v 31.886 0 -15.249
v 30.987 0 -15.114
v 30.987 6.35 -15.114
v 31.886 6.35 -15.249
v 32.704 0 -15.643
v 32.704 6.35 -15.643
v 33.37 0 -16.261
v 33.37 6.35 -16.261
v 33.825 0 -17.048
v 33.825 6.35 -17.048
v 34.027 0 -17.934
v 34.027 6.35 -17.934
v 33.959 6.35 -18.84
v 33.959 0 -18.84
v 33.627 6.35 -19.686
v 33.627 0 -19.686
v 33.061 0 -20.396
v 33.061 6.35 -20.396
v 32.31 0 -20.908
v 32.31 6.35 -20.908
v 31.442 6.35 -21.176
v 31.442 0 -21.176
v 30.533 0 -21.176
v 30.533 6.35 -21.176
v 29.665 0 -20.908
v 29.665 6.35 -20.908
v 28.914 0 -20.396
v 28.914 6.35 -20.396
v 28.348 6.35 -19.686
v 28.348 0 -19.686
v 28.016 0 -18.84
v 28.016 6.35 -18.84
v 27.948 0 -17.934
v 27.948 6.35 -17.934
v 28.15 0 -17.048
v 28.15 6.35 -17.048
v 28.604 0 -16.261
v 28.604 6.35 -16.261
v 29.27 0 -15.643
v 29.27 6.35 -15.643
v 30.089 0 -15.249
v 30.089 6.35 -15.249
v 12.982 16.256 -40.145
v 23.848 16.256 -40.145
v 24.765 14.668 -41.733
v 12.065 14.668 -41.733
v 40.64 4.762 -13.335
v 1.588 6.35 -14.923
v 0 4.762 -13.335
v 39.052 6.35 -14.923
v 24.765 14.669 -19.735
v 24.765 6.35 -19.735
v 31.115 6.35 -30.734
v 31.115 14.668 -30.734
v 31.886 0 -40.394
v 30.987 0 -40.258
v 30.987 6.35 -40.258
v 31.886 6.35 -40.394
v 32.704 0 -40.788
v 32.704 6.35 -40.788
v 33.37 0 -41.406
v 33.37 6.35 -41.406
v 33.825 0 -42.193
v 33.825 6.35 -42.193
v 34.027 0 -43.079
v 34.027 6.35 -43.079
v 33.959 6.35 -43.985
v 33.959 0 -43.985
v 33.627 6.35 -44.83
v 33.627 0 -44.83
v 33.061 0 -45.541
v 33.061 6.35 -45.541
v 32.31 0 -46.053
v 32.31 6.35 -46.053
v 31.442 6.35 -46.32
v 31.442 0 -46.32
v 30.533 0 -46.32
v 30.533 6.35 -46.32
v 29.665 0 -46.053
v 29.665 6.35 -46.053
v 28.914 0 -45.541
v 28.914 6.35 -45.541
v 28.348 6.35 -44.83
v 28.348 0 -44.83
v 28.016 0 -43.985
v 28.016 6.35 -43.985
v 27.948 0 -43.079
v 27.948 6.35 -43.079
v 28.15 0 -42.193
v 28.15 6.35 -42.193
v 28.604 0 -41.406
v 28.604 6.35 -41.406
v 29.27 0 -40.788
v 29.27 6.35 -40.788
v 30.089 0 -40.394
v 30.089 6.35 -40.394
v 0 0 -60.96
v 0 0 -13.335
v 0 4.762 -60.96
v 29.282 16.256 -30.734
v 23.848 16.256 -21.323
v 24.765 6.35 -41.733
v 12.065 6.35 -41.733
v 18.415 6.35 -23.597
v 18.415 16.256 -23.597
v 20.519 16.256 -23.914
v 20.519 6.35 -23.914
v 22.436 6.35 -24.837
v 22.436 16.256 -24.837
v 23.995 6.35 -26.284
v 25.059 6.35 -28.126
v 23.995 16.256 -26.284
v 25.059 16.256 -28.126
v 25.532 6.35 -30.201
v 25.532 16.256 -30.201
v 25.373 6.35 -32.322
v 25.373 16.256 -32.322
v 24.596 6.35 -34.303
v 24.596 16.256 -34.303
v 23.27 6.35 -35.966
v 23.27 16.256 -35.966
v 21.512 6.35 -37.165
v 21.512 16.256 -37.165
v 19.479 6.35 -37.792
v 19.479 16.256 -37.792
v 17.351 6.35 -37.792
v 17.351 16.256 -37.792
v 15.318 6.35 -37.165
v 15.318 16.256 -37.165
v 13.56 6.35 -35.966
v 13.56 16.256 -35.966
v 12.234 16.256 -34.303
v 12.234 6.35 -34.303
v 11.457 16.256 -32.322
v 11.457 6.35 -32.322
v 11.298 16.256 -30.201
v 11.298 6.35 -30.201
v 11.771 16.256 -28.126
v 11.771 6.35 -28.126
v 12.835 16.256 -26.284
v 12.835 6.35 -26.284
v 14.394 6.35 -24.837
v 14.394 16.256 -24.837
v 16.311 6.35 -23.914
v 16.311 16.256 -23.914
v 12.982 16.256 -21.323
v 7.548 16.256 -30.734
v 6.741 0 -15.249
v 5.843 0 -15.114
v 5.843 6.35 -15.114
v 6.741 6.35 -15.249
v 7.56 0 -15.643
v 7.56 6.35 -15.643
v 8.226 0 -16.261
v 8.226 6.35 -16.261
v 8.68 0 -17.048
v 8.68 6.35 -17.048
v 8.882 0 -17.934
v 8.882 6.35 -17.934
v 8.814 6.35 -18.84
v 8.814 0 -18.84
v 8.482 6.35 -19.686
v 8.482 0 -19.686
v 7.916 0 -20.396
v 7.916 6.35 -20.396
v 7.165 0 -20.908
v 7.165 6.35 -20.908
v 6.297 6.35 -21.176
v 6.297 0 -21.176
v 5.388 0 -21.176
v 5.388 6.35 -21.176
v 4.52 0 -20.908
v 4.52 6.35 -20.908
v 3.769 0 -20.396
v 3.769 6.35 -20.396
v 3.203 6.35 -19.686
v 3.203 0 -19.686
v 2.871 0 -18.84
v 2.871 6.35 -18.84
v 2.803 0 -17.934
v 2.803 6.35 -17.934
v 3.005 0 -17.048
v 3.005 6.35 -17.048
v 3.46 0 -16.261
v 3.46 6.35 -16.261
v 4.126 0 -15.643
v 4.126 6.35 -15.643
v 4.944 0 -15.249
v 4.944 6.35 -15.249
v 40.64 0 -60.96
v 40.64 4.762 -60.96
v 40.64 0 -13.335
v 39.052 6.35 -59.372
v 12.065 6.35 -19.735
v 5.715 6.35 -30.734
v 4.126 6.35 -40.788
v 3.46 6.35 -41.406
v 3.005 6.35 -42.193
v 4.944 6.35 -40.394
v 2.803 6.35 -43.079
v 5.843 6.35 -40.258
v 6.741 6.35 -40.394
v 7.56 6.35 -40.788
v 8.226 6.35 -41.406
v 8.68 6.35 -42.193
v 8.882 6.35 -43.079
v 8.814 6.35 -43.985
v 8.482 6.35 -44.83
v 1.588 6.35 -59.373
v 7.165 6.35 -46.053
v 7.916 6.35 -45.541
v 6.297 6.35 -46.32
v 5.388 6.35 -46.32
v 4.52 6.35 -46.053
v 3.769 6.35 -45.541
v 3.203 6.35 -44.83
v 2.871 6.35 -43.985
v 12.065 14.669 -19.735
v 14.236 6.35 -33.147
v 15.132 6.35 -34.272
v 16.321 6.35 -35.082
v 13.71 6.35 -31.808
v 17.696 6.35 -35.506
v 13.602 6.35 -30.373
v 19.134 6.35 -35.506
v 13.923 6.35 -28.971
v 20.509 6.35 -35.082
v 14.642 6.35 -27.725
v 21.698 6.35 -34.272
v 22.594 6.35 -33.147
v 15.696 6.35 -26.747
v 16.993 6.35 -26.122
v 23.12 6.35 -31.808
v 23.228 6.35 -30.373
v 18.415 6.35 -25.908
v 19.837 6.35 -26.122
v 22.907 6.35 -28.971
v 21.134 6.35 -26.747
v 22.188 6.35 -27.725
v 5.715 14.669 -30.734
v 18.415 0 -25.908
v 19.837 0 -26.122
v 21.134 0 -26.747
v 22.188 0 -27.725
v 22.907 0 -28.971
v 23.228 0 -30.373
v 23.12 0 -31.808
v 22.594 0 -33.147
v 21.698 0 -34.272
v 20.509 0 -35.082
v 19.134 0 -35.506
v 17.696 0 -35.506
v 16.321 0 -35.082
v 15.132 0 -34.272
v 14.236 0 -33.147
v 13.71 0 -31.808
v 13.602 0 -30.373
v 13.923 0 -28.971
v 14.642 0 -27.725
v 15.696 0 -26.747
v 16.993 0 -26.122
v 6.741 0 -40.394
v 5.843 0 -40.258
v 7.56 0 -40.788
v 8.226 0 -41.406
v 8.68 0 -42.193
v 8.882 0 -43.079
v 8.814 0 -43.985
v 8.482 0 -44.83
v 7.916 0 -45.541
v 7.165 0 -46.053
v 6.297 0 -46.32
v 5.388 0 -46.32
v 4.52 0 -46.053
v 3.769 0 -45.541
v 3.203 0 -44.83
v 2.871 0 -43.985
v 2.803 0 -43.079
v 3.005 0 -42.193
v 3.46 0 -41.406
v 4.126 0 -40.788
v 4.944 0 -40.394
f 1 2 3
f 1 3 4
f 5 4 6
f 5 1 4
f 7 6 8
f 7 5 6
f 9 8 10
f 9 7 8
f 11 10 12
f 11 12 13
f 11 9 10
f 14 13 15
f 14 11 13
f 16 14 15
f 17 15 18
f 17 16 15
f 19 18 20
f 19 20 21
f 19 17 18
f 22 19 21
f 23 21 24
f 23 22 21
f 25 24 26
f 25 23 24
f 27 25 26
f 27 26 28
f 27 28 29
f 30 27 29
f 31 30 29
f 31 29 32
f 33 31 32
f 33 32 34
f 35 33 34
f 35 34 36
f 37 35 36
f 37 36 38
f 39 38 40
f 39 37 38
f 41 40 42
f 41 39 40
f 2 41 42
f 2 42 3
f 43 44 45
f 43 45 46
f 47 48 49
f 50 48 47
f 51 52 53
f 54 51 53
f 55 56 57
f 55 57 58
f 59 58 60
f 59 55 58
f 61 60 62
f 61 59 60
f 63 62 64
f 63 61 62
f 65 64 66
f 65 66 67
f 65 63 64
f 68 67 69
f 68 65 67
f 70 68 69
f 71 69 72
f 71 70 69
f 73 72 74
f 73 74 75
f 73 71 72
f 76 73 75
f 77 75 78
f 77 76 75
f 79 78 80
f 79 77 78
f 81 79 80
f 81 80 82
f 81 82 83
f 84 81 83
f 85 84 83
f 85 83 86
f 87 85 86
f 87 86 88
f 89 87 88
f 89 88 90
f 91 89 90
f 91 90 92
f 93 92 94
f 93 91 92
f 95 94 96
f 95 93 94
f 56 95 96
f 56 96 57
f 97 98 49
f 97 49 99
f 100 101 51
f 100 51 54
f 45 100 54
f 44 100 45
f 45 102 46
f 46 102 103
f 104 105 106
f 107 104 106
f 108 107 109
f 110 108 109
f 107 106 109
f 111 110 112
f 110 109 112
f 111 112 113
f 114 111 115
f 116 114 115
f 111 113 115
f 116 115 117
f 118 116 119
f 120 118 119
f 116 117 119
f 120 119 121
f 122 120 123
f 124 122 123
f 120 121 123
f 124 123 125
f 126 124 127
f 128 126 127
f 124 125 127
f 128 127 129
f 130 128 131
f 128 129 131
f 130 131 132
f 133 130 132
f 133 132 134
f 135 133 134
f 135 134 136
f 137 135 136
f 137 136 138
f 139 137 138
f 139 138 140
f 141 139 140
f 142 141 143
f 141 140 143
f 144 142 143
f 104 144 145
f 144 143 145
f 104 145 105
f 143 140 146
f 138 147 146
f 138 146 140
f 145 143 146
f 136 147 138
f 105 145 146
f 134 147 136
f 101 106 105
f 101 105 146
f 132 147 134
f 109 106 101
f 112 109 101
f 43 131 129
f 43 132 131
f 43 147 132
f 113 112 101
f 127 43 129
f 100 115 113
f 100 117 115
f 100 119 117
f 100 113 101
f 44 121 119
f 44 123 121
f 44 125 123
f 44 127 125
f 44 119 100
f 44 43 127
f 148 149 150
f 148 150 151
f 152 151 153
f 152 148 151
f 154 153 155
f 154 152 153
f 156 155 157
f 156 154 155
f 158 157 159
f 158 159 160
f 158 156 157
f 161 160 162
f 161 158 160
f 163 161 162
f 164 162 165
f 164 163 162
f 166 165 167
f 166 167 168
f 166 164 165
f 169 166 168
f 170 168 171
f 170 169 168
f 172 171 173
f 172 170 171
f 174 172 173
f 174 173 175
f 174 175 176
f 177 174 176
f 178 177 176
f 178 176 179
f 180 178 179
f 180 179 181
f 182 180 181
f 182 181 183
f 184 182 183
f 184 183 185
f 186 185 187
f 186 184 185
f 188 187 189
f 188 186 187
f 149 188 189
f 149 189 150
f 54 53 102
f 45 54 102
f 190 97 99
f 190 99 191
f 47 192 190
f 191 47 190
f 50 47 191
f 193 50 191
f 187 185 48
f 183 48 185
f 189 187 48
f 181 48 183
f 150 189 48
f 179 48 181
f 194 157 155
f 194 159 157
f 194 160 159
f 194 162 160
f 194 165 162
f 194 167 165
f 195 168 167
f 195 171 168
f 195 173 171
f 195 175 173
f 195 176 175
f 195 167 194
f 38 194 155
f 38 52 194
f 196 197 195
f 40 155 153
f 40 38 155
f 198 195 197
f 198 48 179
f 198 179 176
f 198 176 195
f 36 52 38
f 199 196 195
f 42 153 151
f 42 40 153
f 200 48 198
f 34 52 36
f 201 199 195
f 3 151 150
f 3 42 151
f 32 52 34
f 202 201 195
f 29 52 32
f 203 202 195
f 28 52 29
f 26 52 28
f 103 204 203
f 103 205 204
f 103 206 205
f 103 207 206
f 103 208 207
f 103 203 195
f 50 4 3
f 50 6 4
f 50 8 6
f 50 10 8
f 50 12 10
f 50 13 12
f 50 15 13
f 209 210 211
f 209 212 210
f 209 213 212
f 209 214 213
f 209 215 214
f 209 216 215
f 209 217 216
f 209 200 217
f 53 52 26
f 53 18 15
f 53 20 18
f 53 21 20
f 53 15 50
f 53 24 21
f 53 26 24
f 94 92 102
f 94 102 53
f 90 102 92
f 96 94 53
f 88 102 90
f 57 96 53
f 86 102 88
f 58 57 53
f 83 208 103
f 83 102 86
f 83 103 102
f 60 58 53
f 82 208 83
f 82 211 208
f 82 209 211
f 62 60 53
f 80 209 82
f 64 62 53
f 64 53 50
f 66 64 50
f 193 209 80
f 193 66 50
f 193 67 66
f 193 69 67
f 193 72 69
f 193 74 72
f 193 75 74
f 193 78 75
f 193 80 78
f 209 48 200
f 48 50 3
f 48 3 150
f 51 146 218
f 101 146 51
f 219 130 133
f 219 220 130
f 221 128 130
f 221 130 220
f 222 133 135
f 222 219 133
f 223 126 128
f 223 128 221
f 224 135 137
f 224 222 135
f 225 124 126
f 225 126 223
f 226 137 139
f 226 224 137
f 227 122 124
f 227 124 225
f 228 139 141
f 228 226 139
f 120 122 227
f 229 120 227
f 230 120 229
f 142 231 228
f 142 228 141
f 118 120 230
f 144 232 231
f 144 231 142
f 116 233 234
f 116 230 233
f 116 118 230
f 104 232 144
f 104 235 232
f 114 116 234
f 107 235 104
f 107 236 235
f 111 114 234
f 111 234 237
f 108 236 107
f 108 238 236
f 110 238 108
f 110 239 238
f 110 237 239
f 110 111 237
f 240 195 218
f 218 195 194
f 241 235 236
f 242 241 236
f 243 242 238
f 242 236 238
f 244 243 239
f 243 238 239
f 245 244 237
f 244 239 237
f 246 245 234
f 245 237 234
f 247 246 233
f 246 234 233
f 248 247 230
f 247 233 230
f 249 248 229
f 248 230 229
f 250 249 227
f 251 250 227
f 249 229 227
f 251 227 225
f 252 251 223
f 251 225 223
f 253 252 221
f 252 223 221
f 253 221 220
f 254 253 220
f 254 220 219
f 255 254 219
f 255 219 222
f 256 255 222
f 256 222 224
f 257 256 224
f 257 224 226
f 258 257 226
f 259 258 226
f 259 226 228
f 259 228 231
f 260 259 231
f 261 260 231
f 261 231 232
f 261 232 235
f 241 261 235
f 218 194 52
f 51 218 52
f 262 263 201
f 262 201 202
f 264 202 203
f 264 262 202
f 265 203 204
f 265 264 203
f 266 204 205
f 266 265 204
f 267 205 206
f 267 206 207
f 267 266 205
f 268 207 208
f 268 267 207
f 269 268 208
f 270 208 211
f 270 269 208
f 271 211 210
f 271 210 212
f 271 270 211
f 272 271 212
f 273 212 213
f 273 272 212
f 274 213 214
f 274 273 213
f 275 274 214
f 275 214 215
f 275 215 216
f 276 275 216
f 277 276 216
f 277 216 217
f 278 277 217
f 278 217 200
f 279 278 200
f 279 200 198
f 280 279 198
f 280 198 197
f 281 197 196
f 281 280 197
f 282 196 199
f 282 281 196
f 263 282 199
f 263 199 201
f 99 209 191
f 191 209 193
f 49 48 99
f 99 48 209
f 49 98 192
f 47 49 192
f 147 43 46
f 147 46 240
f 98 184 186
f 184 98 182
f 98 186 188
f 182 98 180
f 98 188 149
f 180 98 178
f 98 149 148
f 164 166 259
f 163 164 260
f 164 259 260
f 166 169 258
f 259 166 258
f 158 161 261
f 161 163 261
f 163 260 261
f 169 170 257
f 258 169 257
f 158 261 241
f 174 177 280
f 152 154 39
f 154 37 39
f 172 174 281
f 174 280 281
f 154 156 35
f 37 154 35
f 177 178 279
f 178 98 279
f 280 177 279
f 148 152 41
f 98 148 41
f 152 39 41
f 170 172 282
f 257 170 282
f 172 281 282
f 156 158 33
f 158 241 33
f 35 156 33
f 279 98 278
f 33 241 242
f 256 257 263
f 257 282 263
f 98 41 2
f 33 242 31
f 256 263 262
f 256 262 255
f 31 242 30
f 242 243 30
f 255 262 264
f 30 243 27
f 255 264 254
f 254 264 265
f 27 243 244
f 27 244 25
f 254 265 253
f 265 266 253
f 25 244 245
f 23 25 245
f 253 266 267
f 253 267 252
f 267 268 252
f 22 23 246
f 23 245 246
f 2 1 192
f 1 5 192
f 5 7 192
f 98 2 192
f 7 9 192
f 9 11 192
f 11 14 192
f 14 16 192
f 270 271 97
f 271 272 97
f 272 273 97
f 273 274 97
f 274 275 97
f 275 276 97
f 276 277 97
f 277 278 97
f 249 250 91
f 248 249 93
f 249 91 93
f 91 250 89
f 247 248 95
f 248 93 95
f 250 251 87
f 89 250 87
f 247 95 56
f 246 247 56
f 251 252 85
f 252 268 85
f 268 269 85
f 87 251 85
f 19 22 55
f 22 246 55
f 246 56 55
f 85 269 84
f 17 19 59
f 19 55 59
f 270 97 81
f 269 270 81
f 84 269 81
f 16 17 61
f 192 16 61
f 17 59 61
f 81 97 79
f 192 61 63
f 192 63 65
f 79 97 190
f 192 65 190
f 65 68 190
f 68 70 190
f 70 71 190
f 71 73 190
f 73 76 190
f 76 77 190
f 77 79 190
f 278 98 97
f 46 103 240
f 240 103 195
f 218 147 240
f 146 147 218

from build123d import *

# Parameters (mm, degrees)
SKETCH1_W           = 40.64
SKETCH1_H           = 47.625
SKETCH1_R           = 3.048
BOSS_EXTRUDE1_DEPTH = 6.35
BOSS_EXTRUDE2_DEPTH = 9.906
SKETCH3_R           = 4.826
CUT_EXTRUDE1_DEPTH  = 76.04657711
SKETCH4_R           = 7.1374
CUT_EXTRUDE2_DEPTH  = 9.906
CHAMFER1_SIZE       = 1.5875


with BuildPart() as part:
    # Sketch1 → Boss-Extrude1 (new body)
    with BuildSketch(Plane(origin=(0, 0, 0), x_dir=(1, 0, 0), z_dir=(0, 1, 0))):
        with Locations((20.32, 37.1475)):
            Rectangle(SKETCH1_W, SKETCH1_H)
        with Locations(Location((30.987358569, 18.161641431, 0), (0, 0, 270))):
            Circle(SKETCH1_R, mode=Mode.SUBTRACT)
        with Locations(Location((30.987358569, 43.306358569, 0), (0, 0, 270))):
            Circle(SKETCH1_R, mode=Mode.SUBTRACT)
        with Locations(Location((5.842641431, 18.161641431, 0), (0, 0, 270))):
            Circle(SKETCH1_R, mode=Mode.SUBTRACT)
        with Locations(Location((5.842641431, 43.306358569, 0), (0, 0, 270))):
            Circle(SKETCH1_R, mode=Mode.SUBTRACT)
    extrude(amount=BOSS_EXTRUDE1_DEPTH)

    # Sketch2 → Boss-Extrude2 (add)
    with BuildSketch(Plane(origin=(0, 6.35, 0), x_dir=(1, 0, 0), z_dir=(0, 1, 0))):
        Polygon((31.115, 30.734), (24.765, 41.732522628), (12.065, 41.732522628), (5.715, 30.734), (12.065, 19.735477372), (24.765, 19.735477372), align=None)
    extrude(amount=BOSS_EXTRUDE2_DEPTH)

    # Sketch3 → Cut-Extrude1 (cut, through all)
    with BuildSketch(Plane(origin=(0, 16.256, 0), x_dir=(1, 0, 0), z_dir=(0, 1, 0))):
        with Locations(Location((18.415, 30.734, 0), (0, 0, 270))):
            Circle(SKETCH3_R)
    extrude(amount=-CUT_EXTRUDE1_DEPTH, mode=Mode.SUBTRACT)

    # Sketch4 → Cut-Extrude2 (cut)
    with BuildSketch(Plane(origin=(0, 16.256, 0), x_dir=(1, 0, 0), z_dir=(0, 1, 0))):
        with Locations(Location((18.415, 30.734, 0), (0, 0, 270))):
            Circle(SKETCH4_R)
    extrude(amount=-CUT_EXTRUDE2_DEPTH, mode=Mode.SUBTRACT)

    # Chamfer1
    chamfer1_edges = [part.edges().sort_by_distance(p)[0] for p in [
        (20.32, 6.35, -60.96),
        (0, 6.35, -37.1475),
        (27.94, 16.256, -25.234738686),
        (27.94, 16.256, -36.233261314),
        (18.415, 16.256, -41.732522628),
        (8.89, 16.256, -36.233261314),
        (8.89, 16.256, -25.234738686),
        (18.415, 16.256, -19.735477372),
        (20.32, 6.35, -13.335),
        (40.64, 6.35, -37.1475),
    ]]
    chamfer(chamfer1_edges, length=CHAMFER1_SIZE)


solid = part.part
